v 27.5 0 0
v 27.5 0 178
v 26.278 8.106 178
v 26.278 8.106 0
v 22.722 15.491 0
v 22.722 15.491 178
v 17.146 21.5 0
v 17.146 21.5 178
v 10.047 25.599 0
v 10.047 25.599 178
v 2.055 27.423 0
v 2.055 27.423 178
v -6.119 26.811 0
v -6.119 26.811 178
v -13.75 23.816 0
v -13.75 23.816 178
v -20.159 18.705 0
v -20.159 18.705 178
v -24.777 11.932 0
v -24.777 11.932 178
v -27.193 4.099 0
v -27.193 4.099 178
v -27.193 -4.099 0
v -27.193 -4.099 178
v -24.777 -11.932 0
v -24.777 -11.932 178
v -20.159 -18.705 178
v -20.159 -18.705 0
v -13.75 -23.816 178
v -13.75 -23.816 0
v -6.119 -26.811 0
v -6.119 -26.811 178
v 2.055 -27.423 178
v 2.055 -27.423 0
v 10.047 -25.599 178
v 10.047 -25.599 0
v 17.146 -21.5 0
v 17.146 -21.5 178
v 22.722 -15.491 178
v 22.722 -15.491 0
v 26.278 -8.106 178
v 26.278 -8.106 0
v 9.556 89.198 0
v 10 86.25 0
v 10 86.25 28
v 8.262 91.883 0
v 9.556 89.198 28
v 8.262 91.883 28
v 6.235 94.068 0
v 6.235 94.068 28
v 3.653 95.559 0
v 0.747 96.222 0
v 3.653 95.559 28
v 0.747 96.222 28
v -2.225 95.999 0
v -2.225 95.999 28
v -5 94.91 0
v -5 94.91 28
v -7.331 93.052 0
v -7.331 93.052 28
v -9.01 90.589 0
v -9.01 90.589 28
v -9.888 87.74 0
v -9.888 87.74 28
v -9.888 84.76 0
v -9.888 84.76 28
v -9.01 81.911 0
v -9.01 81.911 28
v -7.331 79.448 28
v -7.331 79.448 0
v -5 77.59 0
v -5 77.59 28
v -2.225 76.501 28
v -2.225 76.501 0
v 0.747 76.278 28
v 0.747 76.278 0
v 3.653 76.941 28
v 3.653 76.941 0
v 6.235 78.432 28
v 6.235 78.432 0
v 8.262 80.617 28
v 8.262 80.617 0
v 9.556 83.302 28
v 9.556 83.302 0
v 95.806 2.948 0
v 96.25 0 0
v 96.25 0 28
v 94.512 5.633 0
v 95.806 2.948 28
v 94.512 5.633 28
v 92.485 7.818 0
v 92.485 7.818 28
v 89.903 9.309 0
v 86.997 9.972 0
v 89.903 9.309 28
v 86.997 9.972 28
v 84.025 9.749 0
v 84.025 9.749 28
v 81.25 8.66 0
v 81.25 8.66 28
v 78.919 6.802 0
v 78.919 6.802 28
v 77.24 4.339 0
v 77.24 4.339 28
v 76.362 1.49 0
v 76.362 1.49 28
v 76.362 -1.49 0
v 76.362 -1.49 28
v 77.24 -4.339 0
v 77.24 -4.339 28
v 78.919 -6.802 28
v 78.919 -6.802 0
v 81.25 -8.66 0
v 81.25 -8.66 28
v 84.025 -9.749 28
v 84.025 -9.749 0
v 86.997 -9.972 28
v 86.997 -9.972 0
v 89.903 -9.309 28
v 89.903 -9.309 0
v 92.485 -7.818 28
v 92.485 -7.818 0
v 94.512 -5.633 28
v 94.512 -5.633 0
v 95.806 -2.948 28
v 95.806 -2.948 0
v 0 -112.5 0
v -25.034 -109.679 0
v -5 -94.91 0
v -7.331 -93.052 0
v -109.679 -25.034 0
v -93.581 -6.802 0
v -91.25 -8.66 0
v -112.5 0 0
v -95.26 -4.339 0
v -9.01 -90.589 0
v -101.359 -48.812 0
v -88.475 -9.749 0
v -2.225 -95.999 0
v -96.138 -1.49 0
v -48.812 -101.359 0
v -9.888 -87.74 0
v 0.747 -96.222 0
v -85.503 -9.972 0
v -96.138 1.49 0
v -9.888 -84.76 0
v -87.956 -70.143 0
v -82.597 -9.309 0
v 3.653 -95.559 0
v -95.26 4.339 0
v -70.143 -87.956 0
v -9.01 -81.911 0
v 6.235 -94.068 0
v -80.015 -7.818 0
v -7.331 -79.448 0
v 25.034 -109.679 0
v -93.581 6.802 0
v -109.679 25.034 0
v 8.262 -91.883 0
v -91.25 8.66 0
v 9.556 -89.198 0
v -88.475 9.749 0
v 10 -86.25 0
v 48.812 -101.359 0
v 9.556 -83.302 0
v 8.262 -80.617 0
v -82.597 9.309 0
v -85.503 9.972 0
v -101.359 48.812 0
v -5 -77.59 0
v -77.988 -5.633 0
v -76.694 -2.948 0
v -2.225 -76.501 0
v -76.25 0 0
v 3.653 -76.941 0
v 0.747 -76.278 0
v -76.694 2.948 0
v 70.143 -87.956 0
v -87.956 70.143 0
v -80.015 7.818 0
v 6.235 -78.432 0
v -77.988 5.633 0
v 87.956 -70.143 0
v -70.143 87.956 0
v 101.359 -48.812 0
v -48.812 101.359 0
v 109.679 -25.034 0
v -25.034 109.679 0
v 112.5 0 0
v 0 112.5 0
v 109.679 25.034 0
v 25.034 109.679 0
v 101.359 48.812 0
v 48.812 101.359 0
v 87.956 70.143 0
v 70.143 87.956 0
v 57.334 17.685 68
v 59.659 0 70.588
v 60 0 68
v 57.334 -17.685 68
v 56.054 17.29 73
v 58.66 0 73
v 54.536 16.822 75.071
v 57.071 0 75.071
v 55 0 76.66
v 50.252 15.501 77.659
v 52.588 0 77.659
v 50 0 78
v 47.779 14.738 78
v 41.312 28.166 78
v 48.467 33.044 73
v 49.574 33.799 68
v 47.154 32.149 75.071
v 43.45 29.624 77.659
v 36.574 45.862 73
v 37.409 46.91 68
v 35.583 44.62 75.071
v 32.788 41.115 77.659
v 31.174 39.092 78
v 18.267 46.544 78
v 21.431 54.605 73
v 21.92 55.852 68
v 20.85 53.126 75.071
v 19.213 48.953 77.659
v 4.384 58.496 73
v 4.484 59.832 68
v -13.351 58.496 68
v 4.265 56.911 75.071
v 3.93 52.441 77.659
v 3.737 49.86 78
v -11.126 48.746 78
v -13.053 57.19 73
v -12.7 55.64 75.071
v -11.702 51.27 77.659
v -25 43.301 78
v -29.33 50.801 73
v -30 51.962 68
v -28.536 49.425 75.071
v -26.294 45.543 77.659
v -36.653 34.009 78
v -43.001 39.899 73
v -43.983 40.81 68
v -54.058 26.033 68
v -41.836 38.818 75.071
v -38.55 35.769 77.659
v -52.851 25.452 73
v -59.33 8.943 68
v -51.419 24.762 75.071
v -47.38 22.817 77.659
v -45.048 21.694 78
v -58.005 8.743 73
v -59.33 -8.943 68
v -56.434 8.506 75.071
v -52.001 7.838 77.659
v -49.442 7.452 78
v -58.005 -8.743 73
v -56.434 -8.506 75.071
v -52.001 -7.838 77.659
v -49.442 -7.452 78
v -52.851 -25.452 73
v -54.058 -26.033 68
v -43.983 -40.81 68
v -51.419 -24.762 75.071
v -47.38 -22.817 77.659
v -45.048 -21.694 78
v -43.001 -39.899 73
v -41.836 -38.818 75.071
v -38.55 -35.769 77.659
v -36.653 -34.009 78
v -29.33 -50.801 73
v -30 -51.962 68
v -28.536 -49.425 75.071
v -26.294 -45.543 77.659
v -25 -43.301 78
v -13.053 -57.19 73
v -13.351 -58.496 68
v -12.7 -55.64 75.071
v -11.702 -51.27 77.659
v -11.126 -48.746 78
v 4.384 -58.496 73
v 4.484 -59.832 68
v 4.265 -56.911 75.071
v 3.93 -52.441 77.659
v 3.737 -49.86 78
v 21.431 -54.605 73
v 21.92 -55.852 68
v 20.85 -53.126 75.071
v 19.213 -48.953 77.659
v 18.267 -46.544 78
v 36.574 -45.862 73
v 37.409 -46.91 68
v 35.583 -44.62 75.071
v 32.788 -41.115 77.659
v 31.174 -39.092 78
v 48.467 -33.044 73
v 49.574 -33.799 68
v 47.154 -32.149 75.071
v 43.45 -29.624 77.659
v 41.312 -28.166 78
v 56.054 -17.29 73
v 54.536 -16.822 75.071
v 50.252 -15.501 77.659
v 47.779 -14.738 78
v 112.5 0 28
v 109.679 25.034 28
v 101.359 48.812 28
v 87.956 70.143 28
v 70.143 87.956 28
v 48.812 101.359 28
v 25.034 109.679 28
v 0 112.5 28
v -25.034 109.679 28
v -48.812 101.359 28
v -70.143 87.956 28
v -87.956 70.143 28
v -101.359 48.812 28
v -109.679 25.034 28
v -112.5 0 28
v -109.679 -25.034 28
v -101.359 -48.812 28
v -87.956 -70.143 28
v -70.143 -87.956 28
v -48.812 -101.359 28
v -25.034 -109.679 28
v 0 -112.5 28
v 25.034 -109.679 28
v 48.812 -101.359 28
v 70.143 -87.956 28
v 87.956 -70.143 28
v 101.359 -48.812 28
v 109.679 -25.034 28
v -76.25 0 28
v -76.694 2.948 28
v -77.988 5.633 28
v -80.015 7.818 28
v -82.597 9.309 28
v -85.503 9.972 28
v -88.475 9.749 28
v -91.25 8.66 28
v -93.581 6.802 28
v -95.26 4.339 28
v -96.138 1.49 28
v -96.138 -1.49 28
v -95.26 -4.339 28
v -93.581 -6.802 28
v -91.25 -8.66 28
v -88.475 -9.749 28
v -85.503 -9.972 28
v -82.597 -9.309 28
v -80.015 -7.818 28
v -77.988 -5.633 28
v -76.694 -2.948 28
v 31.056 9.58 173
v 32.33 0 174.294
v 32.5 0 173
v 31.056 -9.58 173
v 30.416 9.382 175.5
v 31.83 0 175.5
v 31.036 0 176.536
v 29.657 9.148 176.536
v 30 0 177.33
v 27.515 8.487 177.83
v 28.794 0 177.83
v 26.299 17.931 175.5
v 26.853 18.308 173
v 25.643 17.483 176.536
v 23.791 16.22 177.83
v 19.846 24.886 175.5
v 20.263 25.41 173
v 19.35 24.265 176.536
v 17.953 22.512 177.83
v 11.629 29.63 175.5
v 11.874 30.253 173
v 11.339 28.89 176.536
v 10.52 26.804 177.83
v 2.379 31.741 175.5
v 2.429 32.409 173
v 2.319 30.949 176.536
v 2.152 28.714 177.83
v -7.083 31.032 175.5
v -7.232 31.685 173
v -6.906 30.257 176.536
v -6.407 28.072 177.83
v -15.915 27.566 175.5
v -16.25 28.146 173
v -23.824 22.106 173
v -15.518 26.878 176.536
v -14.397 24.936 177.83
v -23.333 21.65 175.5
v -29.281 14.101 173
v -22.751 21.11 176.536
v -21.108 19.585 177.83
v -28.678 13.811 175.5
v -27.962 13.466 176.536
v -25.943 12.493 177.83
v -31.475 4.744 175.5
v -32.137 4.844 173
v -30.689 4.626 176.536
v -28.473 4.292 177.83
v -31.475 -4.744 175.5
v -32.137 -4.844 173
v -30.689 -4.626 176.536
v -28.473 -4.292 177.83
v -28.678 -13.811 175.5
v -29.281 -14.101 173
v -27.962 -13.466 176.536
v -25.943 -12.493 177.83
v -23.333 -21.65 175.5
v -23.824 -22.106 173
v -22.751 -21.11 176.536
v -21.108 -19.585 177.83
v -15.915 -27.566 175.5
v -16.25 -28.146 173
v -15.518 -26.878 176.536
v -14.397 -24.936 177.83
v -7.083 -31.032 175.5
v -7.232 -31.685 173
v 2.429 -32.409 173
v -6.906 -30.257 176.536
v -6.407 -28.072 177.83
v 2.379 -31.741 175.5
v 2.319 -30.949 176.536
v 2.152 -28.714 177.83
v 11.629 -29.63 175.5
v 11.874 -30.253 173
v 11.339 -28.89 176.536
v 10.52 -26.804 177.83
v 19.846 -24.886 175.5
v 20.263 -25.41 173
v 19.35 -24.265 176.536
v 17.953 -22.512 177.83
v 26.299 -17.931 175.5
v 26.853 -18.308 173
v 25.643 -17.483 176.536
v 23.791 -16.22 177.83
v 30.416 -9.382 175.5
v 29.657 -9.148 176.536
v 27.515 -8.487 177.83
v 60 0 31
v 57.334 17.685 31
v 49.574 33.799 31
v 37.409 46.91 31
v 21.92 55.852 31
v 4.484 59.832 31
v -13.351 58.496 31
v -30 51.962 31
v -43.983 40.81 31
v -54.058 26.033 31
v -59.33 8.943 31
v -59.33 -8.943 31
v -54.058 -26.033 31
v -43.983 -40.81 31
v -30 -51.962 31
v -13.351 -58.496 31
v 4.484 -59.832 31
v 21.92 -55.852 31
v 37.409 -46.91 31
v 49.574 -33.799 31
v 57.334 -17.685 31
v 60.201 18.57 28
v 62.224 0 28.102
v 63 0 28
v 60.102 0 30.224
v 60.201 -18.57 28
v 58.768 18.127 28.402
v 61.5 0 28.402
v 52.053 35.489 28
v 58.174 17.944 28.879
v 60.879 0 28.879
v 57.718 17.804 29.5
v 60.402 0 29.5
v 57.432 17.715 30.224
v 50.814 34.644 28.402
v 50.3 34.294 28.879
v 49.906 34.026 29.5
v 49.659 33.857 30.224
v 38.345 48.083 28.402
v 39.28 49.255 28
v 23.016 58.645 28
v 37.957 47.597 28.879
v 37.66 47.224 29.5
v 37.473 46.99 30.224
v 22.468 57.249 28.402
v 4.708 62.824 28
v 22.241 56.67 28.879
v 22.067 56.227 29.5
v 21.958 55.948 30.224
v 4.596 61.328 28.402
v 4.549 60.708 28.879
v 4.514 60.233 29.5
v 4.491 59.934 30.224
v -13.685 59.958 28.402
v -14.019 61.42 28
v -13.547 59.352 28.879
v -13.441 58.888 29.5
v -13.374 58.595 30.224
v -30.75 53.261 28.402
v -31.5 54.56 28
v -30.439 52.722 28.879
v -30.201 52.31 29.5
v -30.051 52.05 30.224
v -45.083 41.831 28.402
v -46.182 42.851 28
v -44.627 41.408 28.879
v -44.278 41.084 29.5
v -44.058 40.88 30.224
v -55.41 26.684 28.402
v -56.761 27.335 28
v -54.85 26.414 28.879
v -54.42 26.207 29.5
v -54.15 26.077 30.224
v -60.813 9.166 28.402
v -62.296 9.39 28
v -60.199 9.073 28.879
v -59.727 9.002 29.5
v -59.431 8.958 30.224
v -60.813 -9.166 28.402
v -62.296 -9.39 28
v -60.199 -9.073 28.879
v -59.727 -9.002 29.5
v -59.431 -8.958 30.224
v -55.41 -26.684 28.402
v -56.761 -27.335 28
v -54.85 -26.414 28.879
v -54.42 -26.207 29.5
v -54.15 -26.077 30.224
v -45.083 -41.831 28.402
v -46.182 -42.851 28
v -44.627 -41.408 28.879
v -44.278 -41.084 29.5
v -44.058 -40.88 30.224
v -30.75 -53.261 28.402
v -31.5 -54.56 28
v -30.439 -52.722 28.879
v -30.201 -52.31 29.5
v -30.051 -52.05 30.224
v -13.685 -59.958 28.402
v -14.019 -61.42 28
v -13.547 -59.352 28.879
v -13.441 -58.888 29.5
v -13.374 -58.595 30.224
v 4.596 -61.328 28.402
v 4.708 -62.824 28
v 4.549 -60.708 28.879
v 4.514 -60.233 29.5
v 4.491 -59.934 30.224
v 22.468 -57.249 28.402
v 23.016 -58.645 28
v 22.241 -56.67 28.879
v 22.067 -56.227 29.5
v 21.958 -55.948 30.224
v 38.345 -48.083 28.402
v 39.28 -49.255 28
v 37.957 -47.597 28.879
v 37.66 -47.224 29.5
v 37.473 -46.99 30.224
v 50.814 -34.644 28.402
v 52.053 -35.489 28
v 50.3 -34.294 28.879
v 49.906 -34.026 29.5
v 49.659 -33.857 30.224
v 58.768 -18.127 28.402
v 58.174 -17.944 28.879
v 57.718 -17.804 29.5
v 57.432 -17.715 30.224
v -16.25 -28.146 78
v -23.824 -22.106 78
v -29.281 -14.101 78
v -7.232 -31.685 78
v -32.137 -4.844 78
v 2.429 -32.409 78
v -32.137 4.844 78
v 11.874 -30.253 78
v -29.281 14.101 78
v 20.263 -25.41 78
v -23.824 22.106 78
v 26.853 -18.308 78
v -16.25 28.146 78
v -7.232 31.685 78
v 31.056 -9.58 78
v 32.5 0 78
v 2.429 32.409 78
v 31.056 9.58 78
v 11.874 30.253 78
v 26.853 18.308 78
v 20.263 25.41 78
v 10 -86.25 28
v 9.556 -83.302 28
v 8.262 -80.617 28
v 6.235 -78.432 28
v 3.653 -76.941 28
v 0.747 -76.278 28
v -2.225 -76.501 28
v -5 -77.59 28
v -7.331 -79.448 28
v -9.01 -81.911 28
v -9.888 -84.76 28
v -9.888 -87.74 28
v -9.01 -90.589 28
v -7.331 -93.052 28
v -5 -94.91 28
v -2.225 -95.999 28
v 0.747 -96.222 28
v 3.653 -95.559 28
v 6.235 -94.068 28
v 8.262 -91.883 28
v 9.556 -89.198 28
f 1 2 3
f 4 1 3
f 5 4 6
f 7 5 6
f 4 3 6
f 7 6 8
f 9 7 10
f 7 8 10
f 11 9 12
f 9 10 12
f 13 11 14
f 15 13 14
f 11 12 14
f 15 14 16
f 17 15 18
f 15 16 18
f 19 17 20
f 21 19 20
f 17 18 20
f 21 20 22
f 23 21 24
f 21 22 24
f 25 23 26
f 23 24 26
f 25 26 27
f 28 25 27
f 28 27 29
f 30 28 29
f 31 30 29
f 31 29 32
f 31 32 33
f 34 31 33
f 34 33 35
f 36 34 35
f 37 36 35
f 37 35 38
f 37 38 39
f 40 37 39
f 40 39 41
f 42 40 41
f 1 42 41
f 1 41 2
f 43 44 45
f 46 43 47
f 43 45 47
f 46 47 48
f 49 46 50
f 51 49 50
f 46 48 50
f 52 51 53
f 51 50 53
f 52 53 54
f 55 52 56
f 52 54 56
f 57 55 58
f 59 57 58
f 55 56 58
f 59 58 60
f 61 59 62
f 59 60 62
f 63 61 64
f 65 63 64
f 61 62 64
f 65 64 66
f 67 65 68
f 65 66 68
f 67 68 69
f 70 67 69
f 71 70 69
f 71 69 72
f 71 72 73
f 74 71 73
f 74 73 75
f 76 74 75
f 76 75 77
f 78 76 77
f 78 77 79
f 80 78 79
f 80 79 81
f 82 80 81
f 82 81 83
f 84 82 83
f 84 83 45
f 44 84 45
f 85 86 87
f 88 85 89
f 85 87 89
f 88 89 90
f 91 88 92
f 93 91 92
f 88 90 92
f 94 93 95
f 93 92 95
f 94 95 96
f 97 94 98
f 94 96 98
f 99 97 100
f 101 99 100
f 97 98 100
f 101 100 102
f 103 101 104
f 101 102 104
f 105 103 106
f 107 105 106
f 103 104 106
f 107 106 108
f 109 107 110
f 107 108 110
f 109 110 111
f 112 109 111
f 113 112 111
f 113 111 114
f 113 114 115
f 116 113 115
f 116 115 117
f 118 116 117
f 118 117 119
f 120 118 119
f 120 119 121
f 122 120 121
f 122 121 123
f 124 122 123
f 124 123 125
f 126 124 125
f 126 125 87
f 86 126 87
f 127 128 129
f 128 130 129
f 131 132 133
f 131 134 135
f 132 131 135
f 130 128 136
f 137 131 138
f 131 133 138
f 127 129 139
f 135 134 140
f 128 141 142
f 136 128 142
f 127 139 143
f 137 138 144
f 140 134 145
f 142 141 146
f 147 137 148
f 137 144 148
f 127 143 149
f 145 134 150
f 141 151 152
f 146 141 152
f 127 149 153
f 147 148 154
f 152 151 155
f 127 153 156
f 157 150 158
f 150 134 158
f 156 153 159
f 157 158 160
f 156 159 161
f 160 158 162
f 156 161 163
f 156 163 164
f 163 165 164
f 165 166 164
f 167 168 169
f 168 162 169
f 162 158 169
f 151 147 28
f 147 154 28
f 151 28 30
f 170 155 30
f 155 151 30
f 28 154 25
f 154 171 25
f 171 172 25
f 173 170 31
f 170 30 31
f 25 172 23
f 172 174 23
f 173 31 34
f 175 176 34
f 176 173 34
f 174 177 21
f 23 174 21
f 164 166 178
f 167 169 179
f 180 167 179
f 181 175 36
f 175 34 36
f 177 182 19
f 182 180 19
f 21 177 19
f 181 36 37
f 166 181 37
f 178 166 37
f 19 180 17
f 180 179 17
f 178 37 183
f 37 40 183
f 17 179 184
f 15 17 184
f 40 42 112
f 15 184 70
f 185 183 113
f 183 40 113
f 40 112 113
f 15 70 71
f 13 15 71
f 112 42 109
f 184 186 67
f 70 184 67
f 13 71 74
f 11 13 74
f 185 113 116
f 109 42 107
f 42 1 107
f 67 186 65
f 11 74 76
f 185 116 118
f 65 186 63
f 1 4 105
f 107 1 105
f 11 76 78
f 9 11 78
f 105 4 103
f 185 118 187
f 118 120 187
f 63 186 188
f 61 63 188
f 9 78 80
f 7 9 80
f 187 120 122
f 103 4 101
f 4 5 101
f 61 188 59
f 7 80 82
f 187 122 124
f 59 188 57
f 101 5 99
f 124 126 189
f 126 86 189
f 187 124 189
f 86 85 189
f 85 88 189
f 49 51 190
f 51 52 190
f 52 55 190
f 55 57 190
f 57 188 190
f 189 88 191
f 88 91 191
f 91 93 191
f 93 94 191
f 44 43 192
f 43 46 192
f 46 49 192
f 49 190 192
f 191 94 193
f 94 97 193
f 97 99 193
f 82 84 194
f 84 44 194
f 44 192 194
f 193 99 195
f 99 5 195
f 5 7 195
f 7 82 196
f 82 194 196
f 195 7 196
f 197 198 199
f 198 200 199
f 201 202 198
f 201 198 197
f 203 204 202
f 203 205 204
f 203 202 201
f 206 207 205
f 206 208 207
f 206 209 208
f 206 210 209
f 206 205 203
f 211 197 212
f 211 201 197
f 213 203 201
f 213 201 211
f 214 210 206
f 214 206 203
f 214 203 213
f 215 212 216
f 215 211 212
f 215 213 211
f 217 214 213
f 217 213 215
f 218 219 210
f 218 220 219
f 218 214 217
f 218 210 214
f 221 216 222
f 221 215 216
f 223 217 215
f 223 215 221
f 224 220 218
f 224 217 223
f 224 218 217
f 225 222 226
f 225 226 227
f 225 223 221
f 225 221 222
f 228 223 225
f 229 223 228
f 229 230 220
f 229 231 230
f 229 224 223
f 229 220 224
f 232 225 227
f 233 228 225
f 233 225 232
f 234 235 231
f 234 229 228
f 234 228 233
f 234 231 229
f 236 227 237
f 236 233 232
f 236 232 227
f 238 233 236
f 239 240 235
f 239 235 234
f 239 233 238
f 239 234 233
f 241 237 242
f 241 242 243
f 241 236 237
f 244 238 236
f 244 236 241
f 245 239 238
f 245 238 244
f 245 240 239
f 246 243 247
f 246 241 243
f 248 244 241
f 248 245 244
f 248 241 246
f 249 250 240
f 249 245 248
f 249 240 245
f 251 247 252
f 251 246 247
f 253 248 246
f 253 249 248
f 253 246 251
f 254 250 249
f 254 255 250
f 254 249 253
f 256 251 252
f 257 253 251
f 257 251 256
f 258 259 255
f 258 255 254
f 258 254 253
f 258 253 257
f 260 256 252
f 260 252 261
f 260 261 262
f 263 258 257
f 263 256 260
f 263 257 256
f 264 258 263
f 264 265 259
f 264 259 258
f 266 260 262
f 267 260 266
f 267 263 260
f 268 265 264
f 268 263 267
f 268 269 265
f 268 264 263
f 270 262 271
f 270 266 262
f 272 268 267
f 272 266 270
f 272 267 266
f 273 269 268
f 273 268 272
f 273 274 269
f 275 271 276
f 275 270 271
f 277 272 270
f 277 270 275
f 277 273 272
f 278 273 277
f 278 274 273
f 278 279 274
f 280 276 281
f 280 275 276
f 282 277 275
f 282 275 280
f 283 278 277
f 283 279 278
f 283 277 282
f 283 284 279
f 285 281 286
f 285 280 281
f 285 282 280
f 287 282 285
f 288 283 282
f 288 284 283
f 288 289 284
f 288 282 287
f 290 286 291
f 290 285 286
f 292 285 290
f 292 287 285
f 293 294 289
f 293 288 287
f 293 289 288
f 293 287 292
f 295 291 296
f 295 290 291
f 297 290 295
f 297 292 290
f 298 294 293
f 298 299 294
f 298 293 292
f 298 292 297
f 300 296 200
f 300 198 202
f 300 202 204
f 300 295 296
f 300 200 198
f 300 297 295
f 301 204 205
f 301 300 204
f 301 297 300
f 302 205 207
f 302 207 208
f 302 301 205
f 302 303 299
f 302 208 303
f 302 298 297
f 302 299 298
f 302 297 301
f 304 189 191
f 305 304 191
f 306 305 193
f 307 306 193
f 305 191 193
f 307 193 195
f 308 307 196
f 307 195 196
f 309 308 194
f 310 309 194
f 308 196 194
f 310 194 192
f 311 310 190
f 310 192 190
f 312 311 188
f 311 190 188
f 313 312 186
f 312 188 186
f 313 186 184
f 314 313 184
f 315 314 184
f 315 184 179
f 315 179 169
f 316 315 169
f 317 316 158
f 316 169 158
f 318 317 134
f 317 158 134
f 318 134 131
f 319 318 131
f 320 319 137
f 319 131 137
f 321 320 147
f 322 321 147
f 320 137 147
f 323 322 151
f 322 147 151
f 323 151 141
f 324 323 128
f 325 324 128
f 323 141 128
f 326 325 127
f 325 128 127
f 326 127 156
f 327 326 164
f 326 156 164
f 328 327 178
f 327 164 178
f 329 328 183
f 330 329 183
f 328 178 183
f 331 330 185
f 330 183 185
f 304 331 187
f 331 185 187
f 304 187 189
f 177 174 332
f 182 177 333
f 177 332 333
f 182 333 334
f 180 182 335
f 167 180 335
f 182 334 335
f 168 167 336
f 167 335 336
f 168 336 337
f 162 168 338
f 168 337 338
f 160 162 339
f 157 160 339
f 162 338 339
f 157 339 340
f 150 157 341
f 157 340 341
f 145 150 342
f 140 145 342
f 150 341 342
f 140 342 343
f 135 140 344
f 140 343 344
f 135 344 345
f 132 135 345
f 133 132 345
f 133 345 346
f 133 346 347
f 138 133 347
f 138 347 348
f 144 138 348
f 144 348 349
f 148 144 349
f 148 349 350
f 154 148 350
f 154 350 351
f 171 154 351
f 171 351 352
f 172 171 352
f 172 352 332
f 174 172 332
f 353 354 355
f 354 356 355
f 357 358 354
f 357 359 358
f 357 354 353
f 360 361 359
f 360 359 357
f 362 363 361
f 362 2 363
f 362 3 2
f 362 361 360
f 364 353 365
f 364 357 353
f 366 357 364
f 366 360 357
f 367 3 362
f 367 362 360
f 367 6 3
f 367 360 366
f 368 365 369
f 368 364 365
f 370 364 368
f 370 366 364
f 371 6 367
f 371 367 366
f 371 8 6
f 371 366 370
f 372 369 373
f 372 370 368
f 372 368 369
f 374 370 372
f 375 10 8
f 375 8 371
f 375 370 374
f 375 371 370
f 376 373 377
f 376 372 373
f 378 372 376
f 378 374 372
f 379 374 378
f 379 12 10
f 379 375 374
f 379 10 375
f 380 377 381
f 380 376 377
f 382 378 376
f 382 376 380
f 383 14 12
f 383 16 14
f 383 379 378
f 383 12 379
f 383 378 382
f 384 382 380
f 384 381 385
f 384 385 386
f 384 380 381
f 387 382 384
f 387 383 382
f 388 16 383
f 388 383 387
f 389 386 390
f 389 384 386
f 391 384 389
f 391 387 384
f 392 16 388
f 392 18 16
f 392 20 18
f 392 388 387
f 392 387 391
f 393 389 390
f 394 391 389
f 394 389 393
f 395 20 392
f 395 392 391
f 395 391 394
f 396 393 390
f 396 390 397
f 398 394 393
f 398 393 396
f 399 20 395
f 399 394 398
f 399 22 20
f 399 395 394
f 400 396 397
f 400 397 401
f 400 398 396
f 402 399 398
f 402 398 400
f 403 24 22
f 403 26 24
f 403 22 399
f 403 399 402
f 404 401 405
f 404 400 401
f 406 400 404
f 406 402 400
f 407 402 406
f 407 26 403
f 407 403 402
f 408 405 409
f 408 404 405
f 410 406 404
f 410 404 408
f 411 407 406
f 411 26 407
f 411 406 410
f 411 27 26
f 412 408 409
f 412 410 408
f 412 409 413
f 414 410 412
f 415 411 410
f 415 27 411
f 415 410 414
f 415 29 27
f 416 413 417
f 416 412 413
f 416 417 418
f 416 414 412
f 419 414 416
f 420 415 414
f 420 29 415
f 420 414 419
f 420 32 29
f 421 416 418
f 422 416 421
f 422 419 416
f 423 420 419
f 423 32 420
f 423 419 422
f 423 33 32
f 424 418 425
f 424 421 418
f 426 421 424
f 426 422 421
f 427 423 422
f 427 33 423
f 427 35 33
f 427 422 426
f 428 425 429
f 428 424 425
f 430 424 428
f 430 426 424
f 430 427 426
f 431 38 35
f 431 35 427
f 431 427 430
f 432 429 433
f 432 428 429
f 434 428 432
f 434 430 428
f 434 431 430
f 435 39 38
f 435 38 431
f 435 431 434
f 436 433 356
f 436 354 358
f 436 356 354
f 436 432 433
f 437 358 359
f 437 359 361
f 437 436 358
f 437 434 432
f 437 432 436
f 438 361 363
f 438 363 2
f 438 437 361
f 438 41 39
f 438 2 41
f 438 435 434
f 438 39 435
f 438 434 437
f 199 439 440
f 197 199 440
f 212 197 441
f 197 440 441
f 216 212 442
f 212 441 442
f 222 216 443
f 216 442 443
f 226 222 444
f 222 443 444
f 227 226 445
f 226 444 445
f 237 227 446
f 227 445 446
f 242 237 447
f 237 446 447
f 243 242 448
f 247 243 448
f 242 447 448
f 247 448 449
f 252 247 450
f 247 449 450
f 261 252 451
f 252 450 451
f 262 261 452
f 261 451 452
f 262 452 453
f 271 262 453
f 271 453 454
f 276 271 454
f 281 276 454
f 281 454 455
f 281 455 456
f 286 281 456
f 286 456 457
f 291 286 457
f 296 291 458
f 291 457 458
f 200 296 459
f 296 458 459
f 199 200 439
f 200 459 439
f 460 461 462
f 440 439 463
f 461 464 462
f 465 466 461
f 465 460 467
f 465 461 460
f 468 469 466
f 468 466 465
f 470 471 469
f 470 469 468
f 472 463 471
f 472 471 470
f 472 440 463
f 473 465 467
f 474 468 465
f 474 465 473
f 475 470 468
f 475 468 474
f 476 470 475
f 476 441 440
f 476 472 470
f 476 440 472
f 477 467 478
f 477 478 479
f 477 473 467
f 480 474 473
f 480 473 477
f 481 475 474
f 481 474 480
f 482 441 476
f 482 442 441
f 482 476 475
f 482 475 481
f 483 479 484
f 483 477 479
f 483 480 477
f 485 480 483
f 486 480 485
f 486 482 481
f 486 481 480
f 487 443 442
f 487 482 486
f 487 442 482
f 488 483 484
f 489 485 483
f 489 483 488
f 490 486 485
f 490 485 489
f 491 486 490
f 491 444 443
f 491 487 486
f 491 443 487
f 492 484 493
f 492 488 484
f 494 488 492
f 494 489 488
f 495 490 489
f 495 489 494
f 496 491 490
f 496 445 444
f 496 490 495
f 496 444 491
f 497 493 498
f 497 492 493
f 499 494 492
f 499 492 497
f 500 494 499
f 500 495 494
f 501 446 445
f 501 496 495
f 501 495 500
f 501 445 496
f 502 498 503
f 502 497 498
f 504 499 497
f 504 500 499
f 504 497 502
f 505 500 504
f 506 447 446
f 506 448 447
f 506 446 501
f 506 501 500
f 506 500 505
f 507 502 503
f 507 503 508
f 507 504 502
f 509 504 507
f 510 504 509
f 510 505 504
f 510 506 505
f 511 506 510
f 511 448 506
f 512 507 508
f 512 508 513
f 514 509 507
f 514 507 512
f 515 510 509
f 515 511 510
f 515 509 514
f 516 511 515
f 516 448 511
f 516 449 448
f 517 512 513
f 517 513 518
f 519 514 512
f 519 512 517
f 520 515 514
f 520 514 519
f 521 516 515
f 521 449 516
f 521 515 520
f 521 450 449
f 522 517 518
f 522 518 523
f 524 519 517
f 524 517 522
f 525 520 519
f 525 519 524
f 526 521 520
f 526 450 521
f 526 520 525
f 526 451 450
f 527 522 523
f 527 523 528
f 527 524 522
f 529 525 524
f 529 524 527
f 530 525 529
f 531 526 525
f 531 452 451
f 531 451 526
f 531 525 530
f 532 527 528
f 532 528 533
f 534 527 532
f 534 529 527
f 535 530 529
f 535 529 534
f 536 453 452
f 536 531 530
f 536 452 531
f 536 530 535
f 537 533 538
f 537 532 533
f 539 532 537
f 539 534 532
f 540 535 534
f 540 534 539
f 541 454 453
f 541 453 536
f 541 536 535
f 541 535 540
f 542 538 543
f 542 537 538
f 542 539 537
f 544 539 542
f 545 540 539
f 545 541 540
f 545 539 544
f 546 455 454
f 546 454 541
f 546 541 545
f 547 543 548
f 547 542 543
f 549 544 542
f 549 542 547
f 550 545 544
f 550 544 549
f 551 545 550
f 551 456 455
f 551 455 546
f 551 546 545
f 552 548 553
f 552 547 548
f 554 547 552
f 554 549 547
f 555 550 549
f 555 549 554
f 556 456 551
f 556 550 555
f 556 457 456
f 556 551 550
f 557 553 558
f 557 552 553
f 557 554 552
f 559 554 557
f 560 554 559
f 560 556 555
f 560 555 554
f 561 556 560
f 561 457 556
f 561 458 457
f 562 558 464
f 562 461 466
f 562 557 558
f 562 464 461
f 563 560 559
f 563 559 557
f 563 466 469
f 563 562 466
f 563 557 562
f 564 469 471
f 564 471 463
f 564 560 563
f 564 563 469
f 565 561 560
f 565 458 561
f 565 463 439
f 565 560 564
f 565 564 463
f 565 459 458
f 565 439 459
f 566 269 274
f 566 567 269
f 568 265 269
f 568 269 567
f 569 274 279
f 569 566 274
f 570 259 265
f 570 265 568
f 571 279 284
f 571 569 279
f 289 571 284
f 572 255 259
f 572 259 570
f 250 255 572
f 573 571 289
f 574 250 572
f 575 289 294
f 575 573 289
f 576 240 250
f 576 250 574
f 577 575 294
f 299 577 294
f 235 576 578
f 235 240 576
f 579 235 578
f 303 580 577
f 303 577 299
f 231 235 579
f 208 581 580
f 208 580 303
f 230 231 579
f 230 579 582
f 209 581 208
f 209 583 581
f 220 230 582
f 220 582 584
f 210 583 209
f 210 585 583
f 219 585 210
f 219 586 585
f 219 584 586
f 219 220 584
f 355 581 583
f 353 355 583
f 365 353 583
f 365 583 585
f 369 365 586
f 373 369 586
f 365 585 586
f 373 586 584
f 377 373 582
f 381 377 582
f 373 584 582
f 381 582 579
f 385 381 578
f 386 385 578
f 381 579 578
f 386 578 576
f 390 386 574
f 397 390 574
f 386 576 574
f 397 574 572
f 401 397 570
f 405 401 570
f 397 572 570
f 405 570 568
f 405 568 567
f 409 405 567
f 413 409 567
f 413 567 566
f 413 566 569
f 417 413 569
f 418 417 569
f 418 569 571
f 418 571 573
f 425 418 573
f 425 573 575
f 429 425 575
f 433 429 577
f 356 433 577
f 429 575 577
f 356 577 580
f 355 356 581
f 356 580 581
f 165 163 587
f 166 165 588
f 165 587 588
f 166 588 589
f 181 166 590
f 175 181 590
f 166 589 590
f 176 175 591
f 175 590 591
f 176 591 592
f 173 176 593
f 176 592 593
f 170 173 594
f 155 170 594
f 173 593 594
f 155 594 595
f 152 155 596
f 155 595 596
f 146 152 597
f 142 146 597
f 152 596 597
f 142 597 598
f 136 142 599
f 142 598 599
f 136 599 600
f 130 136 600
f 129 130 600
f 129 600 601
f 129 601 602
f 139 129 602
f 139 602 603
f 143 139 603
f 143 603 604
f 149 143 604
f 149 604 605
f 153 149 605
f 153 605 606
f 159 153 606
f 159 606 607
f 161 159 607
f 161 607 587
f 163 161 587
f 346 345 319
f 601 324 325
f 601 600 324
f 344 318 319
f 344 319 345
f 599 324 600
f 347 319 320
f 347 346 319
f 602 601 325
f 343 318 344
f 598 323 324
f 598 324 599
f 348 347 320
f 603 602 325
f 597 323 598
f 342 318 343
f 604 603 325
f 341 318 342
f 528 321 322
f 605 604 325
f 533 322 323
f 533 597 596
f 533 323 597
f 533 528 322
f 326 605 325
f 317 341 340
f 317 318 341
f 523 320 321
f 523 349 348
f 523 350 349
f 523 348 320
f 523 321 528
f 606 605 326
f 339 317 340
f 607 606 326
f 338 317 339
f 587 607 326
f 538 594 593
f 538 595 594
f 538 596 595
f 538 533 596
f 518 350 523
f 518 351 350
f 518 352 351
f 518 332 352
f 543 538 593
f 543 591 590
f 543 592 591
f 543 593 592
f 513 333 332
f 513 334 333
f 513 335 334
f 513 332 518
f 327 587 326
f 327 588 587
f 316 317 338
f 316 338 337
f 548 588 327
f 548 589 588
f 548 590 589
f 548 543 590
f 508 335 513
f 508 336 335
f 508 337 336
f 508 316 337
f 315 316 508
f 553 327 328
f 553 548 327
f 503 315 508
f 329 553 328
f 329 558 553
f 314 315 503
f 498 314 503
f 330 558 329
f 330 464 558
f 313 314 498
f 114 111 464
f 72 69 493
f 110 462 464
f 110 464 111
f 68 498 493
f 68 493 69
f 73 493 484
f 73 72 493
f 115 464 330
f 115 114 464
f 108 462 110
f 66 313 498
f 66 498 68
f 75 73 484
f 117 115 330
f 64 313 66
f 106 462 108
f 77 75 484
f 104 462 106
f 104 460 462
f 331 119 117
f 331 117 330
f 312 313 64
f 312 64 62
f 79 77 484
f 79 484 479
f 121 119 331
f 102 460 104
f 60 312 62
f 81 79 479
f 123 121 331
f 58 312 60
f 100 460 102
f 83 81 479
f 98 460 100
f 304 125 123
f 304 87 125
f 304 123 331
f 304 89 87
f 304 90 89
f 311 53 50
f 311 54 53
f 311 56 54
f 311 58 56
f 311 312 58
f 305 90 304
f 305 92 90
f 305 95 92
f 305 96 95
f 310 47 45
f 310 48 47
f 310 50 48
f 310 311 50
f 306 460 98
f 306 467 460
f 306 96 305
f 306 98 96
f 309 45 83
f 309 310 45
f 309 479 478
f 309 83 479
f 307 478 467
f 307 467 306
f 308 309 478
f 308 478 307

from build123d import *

# Parameters (mm, degrees)
SKETCH2_R           = 112.5
BOSS_EXTRUDE1_DEPTH = 28
SKETCH4_R           = 60
BOSS_EXTRUDE5_DEPTH = 50
FILLET2_R           = 3
FILLET3_R           = 10
SKETCH7_R           = 32.5
BOSS_EXTRUDE7_DEPTH = 100
SKETCH8_R           = 27.5
CUT_EXTRUDE1_DEPTH  = 239.73939767
SKETCH9_R           = 10
CUT_EXTRUDE2_DEPTH  = 219.660696057
FILLET4_R           = 5


with BuildPart() as part:
    # Sketch2 → Boss-Extrude1 (new body)
    with BuildSketch(Plane.XY):
        Circle(SKETCH2_R)
    extrude(amount=BOSS_EXTRUDE1_DEPTH)

    # Sketch4 → Boss-Extrude5 (add)
    with BuildSketch(Plane.XY.offset(28)):
        Circle(SKETCH4_R)
    extrude(amount=BOSS_EXTRUDE5_DEPTH)

    # Fillet2
    fillet2_edges = [part.edges().sort_by_distance(p)[0] for p in [
        (-60, 0, 28),
    ]]
    fillet(fillet2_edges, radius=FILLET2_R)

    # Fillet3
    fillet3_edges = [part.edges().sort_by_distance(p)[0] for p in [
        (-60, 0, 78),
    ]]
    fillet(fillet3_edges, radius=FILLET3_R)

    # Sketch7 → Boss-Extrude7 (add)
    with BuildSketch(Plane.XY.offset(78)):
        Circle(SKETCH7_R)
    extrude(amount=BOSS_EXTRUDE7_DEPTH)

    # Sketch8 → Cut-Extrude1 (cut, through all)
    with BuildSketch(Plane.XY.offset(178)):
        Circle(SKETCH8_R)
    extrude(amount=-CUT_EXTRUDE1_DEPTH, mode=Mode.SUBTRACT)

    # Sketch9 → Cut-Extrude2 (cut, through all)
    with BuildSketch(Plane.XY.offset(28)):
        with Locations((0, 86.25)):
            Circle(SKETCH9_R)
        with Locations((86.25, 0)):
            Circle(SKETCH9_R)
        with Locations((0, -86.25)):
            Circle(SKETCH9_R)
        with Locations((-86.25, 0)):
            Circle(SKETCH9_R)
    extrude(amount=-CUT_EXTRUDE2_DEPTH, mode=Mode.SUBTRACT)

    # Fillet4
    fillet4_edges = [part.edges().sort_by_distance(p)[0] for p in [
        (-32.5, 0, 178),
    ]]
    fillet(fillet4_edges, radius=FILLET4_R - 0.0001)  # a hair under: the kernel refuses the full size


solid = part.part
